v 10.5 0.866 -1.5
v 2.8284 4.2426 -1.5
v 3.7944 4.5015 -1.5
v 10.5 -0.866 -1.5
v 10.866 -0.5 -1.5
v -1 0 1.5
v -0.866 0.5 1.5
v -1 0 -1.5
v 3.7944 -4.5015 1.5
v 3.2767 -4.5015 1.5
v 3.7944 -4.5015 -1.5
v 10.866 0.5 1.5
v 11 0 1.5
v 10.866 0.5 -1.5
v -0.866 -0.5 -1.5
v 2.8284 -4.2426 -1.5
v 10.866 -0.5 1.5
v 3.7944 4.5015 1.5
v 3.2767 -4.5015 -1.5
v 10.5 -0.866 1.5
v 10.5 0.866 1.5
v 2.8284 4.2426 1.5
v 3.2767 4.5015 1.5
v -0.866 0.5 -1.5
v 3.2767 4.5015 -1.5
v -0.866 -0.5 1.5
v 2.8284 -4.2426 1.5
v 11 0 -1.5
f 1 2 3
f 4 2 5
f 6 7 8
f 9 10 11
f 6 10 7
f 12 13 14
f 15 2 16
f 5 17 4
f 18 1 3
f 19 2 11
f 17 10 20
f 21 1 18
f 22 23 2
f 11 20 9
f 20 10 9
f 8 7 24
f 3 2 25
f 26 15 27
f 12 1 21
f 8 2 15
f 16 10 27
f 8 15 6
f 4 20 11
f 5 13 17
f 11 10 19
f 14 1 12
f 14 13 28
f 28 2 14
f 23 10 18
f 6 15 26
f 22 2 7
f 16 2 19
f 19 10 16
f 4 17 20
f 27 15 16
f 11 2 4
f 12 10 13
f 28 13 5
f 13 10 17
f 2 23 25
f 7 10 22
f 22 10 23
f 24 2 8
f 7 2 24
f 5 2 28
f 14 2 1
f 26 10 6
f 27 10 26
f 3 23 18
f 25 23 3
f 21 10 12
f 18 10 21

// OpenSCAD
//Modular Scales?
// Created by Juan Angueyra (angueyra@gmail.com)
// June 2015

// Variables
anchor_r=1;
anchor_h=3;

delta_x=10;
noise_x=0;

delta_y=5;
noise_y=0;

phi_1=-45;
phinoise_1=0;

phi_2=180+phi_1;
phinoise_2=0;


n_faces=12;

// main call
3Dprintflag=0;
scale_tr = 3Dprintflag ? [0,0,0] : [0,0,0];
scale_rot = 3Dprintflag ? [0,0,0] : [0,0,0];
translate(scale_tr){rotate(scale_rot){fscale();}}


module fscale() {
	hull(){
		translate([0,0,0]) {anchor();}
		translate([delta_x+noise_x,0,0]) {anchor();}
		rotate([0,0,phi_1]) {translate([0,(delta_y+noise_y),0]) {anchor();}}
		rotate([0,0,-phi_2]) {translate([0,(delta_y+noise_y),0]) {anchor();}}
	}
}

module anchor(){cylinder(r=anchor_r, h=anchor_h, $fn=n_faces, center=true);}


// (c)2013 Felipe Sanches <juca@members.fsf.org>
// licensed under the terms of the GNU GPL version 3 (or later)

function normalize(v) = v/(sqrt(v[0]*v[0] + v[1]*v[1]));

module voronoi(points, L=200, thickness=1, round=6, nuclei=true){
	for (p=points){
		difference(){
			minkowski(){
			intersection_for(p1=points){
				if (p!=p1){
					translate((p+p1)/2 - normalize(p1-p) * (thickness+round))
					assign(angle=90+atan2(p[1]-p1[1], p[0]-p1[0])){
						rotate([0,0,angle])
						translate([-L,-L])
						square([2*L, L]);
					}
				}
			}
			circle(r=round, $fn=20);
			}
			if (nuclei)
			translate(p) circle(r=1, $fn=20);
		}
	}
}


module random_voronoi(n=20, nuclei=true, L=200, thickness=1, round=6, min=0, max=100, seed=42){

	x = rands(min, max, n, seed);
	y = rands(min, max, n, seed+1);

	for (i=[0:n-1]){
		difference(){
			minkowski(){
			intersection_for(j=[0:n-1]){
				if (i!=j){
					assign(p=[x[i],y[i]], p1=[x[j],y[j]]){
						translate((p+p1)/2 - normalize(p1-p) * (thickness+round))
						assign(angle=90+atan2(p[1]-p1[1], p[0]-p1[0])){
							rotate([0,0,angle])
							translate([-L,-L])
							square([2*L, L]);
						}
					}
				}
			}
			circle(r=round, $fn=20);
			}
			if (nuclei)
			translate([x[i],y[i]]) circle(r=1, $fn=20);
		}
	}
}

// example with an explicit list of points:
// point_set = [[0,0],[30,0],[20,10],[50,20],[15,30],[85,30],[35,30],[12,60], [45,50],[80,80],[20,-40],[-20,20],[-15,10],[-15,50]];
// voronoi(points=point_set, round=4, nuclei=false);


// example with randomly generated set of points
// random_voronoi(n=64, round=6, min=0, max=300);
